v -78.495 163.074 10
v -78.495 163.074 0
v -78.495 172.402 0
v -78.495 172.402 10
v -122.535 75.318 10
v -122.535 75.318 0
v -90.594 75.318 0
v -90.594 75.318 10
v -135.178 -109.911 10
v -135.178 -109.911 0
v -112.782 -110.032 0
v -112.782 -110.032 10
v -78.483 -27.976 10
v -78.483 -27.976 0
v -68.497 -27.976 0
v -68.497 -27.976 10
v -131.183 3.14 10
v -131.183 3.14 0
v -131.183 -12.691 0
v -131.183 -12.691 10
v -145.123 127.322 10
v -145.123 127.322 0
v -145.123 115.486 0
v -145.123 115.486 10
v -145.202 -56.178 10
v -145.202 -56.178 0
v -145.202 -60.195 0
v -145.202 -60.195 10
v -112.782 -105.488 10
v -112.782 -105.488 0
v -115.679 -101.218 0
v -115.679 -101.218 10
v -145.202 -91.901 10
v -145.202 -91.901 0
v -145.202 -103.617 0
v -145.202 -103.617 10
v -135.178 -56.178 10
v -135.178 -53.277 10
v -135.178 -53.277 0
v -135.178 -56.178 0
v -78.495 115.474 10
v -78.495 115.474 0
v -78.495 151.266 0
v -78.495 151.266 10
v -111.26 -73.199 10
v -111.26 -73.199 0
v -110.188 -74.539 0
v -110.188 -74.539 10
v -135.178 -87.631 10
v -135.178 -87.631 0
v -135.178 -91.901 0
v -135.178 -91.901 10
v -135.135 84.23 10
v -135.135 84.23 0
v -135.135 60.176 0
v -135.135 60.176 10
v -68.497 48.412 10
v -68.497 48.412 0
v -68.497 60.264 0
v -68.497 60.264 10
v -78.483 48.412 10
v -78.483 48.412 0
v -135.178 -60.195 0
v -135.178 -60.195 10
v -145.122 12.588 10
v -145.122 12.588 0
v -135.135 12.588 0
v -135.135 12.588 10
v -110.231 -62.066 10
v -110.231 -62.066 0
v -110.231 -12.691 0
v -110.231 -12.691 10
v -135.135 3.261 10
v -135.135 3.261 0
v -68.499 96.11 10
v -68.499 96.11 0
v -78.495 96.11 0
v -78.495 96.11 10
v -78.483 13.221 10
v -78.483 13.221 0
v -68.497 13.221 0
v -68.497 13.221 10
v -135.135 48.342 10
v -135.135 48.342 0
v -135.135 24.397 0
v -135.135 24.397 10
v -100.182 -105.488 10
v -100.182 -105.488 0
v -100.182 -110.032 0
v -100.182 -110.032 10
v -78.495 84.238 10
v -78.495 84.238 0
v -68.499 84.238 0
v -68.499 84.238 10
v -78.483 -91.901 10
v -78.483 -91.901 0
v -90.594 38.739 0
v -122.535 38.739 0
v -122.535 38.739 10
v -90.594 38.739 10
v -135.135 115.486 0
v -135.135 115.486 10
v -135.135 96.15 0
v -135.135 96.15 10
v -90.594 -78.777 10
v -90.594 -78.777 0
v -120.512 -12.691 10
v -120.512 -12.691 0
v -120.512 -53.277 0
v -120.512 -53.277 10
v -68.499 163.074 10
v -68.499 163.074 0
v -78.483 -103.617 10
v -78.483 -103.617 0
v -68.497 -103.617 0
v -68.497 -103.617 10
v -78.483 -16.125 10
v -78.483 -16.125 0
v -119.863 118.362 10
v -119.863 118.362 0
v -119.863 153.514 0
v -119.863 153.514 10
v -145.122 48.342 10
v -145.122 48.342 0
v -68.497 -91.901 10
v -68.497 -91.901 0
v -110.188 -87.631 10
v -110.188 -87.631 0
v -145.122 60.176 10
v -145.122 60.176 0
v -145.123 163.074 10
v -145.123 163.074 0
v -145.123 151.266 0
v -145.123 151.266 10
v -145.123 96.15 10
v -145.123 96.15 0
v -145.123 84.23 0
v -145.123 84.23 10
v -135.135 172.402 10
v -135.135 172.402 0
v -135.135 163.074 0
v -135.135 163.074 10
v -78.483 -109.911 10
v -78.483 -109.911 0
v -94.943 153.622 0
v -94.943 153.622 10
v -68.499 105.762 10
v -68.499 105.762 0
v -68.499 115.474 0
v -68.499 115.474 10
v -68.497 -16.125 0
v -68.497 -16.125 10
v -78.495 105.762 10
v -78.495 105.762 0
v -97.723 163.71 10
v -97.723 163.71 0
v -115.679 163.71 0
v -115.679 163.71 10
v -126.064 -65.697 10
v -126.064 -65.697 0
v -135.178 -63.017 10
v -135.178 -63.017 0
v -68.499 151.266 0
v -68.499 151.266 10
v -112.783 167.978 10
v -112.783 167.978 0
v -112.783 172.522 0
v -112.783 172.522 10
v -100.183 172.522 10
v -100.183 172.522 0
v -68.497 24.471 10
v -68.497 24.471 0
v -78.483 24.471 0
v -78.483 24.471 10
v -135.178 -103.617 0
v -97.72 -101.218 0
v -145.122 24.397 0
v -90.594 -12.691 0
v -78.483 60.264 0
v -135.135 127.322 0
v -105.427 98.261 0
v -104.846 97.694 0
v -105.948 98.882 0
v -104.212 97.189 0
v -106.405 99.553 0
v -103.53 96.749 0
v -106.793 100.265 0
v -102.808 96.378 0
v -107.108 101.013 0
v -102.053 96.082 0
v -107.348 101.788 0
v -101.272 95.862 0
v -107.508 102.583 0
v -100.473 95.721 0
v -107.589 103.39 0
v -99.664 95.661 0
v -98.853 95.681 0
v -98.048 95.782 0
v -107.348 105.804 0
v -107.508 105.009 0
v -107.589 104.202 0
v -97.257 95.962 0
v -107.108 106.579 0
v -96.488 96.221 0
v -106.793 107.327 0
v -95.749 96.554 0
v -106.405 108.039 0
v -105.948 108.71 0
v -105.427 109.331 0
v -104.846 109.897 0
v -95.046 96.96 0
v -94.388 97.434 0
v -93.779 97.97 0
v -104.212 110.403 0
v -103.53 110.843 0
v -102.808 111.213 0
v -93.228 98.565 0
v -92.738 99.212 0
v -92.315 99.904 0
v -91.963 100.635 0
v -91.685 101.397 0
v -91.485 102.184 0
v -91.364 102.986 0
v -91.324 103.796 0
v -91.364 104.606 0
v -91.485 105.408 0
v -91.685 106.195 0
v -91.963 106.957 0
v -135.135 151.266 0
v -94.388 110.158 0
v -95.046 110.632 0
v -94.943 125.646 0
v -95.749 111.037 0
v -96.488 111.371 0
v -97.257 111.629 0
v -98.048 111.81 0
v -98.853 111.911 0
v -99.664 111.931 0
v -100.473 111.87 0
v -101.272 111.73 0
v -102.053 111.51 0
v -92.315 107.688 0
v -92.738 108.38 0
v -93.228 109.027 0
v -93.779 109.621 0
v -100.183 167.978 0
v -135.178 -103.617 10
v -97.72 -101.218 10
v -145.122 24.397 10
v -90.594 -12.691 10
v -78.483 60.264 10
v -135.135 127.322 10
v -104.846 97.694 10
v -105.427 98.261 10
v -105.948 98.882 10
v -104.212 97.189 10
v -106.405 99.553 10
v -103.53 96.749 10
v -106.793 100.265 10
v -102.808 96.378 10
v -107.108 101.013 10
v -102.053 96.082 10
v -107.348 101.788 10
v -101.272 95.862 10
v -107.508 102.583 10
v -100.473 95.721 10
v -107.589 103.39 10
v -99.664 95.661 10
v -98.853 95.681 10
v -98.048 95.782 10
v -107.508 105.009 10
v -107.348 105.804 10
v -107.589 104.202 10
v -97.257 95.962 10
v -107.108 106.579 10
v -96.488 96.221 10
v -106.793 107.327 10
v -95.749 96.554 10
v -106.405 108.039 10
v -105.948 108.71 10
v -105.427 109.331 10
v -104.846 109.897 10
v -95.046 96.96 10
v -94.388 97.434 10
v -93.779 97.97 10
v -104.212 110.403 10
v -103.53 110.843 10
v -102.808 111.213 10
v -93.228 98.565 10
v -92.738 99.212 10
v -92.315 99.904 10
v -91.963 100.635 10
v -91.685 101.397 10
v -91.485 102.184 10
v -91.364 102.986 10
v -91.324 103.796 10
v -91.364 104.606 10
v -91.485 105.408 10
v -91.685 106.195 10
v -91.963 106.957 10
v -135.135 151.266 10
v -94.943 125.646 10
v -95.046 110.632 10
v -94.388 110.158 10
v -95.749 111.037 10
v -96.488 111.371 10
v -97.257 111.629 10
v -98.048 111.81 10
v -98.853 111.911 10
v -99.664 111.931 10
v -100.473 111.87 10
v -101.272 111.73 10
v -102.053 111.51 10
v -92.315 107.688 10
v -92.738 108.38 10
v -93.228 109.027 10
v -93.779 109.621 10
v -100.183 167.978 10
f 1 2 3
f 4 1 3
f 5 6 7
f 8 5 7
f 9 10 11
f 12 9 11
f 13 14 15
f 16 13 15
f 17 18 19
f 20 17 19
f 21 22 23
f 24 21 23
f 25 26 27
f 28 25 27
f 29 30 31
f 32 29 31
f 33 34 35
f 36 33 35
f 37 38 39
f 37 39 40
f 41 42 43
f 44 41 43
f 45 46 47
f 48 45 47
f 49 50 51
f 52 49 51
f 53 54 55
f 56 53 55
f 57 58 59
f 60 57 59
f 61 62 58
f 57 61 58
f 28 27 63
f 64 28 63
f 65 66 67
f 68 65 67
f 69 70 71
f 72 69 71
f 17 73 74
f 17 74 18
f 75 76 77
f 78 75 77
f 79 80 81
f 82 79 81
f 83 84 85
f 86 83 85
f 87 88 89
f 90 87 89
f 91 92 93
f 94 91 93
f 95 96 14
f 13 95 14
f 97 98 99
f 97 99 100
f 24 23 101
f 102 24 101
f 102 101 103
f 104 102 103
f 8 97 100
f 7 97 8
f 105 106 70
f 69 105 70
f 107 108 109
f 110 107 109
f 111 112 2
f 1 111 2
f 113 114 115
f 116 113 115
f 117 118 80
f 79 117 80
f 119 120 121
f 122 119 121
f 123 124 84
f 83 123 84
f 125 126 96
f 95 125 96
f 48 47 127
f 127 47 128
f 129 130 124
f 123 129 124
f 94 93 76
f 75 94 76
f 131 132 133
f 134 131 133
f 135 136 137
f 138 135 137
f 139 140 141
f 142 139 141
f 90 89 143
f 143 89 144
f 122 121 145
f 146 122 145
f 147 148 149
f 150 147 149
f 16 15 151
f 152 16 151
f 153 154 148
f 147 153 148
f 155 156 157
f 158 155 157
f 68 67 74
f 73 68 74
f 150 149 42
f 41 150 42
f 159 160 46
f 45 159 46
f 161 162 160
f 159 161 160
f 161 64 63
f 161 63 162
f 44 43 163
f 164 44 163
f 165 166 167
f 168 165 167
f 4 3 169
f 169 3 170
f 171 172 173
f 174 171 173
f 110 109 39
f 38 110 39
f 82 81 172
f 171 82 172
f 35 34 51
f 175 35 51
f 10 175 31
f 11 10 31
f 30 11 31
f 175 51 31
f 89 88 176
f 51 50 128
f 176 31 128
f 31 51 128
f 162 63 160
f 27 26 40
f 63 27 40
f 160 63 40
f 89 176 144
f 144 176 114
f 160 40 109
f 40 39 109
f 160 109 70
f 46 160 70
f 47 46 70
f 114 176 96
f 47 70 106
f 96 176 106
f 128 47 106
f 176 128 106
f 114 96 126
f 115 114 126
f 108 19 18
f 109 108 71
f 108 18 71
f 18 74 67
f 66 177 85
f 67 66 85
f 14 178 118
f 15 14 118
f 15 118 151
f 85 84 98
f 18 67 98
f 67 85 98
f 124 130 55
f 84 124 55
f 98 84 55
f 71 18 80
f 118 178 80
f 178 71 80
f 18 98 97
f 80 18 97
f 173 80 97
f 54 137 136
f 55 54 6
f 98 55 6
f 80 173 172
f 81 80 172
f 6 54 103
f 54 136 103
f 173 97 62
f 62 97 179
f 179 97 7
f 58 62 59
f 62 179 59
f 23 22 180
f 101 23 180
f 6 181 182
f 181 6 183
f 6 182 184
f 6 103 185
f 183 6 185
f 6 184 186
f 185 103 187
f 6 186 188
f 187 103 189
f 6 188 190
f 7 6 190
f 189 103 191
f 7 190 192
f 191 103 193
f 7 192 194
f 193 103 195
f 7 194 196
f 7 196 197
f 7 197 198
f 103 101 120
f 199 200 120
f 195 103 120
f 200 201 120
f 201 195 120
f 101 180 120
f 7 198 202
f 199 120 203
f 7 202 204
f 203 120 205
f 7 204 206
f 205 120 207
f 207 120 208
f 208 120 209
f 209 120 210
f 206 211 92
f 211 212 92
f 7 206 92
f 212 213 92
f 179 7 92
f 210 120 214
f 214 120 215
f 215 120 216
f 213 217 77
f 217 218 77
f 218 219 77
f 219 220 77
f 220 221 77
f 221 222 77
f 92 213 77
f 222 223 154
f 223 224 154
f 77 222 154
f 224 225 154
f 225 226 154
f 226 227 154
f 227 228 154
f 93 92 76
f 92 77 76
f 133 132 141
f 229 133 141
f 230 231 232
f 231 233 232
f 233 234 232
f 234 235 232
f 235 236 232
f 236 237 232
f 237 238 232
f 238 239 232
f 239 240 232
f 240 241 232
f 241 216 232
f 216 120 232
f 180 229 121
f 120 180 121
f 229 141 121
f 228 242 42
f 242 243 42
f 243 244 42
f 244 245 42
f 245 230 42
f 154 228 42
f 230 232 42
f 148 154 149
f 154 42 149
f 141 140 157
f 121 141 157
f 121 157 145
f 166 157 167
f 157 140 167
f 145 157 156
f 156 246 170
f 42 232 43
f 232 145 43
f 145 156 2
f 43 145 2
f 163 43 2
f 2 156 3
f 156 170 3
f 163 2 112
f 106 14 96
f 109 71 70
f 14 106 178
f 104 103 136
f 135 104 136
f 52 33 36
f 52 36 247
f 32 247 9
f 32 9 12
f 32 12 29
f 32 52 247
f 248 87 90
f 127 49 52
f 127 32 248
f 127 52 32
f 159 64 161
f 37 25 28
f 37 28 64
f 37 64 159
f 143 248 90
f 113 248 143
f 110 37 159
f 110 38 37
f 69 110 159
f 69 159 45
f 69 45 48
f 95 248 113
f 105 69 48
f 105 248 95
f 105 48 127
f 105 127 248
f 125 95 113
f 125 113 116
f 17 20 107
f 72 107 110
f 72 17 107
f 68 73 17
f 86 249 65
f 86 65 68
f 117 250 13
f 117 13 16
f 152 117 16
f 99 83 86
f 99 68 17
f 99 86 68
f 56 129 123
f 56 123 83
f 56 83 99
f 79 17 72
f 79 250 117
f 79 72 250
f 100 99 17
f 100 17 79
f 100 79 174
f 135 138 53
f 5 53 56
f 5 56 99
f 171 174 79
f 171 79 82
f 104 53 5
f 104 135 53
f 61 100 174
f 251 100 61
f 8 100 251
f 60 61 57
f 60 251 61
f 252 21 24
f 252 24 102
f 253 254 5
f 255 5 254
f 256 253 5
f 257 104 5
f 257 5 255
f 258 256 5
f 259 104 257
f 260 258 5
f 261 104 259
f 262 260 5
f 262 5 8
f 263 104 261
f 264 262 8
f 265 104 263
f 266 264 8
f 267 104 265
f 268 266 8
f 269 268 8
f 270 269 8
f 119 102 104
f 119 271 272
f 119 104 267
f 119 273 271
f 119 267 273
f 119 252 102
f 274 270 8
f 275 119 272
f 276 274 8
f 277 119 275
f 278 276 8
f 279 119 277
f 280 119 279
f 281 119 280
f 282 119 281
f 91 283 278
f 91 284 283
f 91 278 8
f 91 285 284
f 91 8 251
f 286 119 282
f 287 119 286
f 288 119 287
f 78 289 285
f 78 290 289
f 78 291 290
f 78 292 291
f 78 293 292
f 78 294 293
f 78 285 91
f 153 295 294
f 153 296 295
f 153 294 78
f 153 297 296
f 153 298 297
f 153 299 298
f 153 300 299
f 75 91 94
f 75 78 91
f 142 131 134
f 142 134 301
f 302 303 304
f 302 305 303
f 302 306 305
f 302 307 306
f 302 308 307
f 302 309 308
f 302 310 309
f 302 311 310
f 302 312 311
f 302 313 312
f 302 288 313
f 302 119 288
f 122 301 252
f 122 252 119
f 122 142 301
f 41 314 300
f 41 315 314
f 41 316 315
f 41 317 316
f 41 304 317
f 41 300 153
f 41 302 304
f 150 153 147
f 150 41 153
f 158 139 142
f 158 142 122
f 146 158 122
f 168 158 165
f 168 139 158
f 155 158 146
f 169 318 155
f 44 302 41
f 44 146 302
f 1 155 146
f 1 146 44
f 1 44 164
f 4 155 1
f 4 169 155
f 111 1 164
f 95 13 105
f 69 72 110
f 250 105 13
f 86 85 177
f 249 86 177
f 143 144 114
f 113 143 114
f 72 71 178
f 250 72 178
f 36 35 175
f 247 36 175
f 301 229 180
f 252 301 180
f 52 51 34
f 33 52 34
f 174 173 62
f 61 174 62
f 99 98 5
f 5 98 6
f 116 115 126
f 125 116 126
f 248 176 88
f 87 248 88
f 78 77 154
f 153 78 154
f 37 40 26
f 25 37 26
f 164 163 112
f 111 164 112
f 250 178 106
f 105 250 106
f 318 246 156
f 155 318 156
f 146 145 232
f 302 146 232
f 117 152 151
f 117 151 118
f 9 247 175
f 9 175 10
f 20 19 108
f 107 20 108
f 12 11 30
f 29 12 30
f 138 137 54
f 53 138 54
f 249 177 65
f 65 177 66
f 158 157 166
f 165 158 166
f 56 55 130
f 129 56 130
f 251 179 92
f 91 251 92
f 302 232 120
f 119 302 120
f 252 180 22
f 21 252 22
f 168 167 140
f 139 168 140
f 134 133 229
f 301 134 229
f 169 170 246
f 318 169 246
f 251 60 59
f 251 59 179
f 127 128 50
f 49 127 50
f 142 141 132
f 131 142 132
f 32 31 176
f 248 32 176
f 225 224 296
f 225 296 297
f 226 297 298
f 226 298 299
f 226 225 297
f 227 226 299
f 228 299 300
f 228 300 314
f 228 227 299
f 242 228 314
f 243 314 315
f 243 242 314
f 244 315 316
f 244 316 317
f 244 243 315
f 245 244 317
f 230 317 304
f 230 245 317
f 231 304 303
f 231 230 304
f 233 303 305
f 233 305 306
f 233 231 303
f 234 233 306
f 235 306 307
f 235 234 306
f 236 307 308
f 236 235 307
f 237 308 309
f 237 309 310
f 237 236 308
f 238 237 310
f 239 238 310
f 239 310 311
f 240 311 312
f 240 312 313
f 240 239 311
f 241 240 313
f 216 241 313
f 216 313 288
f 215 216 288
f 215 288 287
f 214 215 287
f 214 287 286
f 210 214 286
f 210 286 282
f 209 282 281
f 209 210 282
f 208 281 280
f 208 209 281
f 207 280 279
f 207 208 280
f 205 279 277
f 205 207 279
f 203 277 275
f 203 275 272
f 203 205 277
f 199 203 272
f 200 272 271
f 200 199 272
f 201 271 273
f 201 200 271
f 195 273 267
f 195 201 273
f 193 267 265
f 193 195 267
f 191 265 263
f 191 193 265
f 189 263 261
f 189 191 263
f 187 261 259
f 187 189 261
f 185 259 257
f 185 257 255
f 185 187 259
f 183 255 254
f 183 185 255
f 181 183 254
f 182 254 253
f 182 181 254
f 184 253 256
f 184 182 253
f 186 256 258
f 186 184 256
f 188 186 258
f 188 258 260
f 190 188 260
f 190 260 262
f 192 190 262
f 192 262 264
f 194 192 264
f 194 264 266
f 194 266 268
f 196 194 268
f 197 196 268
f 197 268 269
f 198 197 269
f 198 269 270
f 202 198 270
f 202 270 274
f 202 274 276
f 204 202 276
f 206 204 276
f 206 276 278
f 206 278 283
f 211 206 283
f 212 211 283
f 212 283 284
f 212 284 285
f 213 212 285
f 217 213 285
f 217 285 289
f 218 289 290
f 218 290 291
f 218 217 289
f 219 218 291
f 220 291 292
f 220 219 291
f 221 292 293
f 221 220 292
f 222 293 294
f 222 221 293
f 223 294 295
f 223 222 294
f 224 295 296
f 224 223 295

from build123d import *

# Parameters (mm, degrees)
SKETCH_4_R      = 8.137661996
SKETCH_4_W      = 31.9414987
SKETCH_4_H      = 36.578678147
EXTRUDE_1_DEPTH = 10


with BuildPart() as part:
    # 草图4 → 凸台-拉伸1 (new body)
    with BuildSketch(Plane.XY):
        Polygon((-115.679167542, 163.709819989), (-112.783171997, 167.977826386), (-112.783171997, 172.521825104), (-135.13516787, 172.401821332), (-135.13516787, 163.073818402), (-145.12317358, 163.073823243), (-145.12317358, 151.265824585), (-135.13516787, 151.265819745), (-135.13516787, 127.321818547), (-145.12317358, 127.321823388), (-145.12317358, 115.485822707), (-135.13517271, 115.485822707), (-135.13517271, 96.149821549), (-145.123168739, 96.149816708), (-145.123168739, 84.229816632), (-135.13516787, 84.229816632), (-135.13516787, 60.175815779), (-145.121572289, 60.175815779), (-145.121564659, 48.342350203), (-135.13516024, 48.342350203), (-135.135152611, 24.396549422), (-145.121564659, 24.396549422), (-145.12155703, 12.587940413), (-135.135152611, 12.587940413), (-135.135152611, 3.261310774), (-131.182853493, 3.139713484), (-131.182853493, -12.691325945), (-120.512386116, -12.691325945), (-120.512386116, -53.276546281), (-135.177665504, -53.276546281), (-135.177665504, -56.177557678), (-145.201591286, -56.177547258), (-145.201591286, -60.195171159), (-135.177670343, -60.195181579), (-135.177670343, -63.017477722), (-126.064049585, -65.69681427), (-111.259845528, -73.199390215), (-110.188045296, -74.539134782), (-110.18804911, -87.630618852), (-135.177657875, -87.630618852), (-135.177657875, -91.900821489), (-145.201591286, -91.900821489), (-145.201591286, -103.616760057), (-135.177657875, -103.616760057), (-135.177657875, -109.910648149), (-112.782481941, -110.032245439), (-112.782471521, -105.487982482), (-115.679146631, -101.218363494), (-97.719758046, -101.218377487), (-100.181937965, -105.487979692), (-100.181937965, -110.032241624), (-78.482952936, -109.910639495), (-78.482950005, -103.616755218), (-68.496559961, -103.616759033), (-68.496559961, -91.90081665), (-78.482960566, -91.90081665), (-78.482959541, -27.976309509), (-68.496556147, -27.976309509), (-68.496556147, -16.124869079), (-78.482955727, -16.124869079), (-78.48294619, 13.220635682), (-68.49654661, 13.220635682), (-68.496550425, 24.47091034), (-78.482954844, 24.47091034), (-78.482957634, 48.412209778), (-68.496554239, 48.412209778), (-68.496558054, 60.263650208), (-78.482957634, 60.263650208), (-78.495166571, 84.237820893), (-68.499169214, 84.237820893), (-68.499169214, 96.109822541), (-78.495171412, 96.109822541), (-78.495171412, 105.761817174), (-68.499164374, 105.761817174), (-68.499164374, 115.473818021), (-78.495171412, 115.473822861), (-78.495171412, 151.265819745), (-68.499164374, 151.265819745), (-68.499169214, 163.073823243), (-78.495166573, 163.073818402), (-78.495166573, 172.401821332), (-100.183171615, 172.521825104), (-100.183171615, 167.977826386), (-97.72316626, 163.709819989), align=None)
        with Locations((-99.461505196, 103.795957581)):
            Circle(SKETCH_4_R, mode=Mode.SUBTRACT)
        Polygon((-110.230805262, -12.691321106), (-90.593654427, -12.691325945), (-90.593668373, -78.776897231), (-110.230815681, -62.066013139), align=None, mode=Mode.SUBTRACT)
        with Locations((-106.564418137, 57.028483651)):
            Rectangle(SKETCH_4_W, SKETCH_4_H, mode=Mode.SUBTRACT)
        Polygon((-119.863172396, 153.513820843), (-94.943171363, 153.621818753), (-94.943166525, 125.645818429), (-119.863172396, 118.361822902), align=None, mode=Mode.SUBTRACT)
    extrude(amount=EXTRUDE_1_DEPTH)


solid = part.part
